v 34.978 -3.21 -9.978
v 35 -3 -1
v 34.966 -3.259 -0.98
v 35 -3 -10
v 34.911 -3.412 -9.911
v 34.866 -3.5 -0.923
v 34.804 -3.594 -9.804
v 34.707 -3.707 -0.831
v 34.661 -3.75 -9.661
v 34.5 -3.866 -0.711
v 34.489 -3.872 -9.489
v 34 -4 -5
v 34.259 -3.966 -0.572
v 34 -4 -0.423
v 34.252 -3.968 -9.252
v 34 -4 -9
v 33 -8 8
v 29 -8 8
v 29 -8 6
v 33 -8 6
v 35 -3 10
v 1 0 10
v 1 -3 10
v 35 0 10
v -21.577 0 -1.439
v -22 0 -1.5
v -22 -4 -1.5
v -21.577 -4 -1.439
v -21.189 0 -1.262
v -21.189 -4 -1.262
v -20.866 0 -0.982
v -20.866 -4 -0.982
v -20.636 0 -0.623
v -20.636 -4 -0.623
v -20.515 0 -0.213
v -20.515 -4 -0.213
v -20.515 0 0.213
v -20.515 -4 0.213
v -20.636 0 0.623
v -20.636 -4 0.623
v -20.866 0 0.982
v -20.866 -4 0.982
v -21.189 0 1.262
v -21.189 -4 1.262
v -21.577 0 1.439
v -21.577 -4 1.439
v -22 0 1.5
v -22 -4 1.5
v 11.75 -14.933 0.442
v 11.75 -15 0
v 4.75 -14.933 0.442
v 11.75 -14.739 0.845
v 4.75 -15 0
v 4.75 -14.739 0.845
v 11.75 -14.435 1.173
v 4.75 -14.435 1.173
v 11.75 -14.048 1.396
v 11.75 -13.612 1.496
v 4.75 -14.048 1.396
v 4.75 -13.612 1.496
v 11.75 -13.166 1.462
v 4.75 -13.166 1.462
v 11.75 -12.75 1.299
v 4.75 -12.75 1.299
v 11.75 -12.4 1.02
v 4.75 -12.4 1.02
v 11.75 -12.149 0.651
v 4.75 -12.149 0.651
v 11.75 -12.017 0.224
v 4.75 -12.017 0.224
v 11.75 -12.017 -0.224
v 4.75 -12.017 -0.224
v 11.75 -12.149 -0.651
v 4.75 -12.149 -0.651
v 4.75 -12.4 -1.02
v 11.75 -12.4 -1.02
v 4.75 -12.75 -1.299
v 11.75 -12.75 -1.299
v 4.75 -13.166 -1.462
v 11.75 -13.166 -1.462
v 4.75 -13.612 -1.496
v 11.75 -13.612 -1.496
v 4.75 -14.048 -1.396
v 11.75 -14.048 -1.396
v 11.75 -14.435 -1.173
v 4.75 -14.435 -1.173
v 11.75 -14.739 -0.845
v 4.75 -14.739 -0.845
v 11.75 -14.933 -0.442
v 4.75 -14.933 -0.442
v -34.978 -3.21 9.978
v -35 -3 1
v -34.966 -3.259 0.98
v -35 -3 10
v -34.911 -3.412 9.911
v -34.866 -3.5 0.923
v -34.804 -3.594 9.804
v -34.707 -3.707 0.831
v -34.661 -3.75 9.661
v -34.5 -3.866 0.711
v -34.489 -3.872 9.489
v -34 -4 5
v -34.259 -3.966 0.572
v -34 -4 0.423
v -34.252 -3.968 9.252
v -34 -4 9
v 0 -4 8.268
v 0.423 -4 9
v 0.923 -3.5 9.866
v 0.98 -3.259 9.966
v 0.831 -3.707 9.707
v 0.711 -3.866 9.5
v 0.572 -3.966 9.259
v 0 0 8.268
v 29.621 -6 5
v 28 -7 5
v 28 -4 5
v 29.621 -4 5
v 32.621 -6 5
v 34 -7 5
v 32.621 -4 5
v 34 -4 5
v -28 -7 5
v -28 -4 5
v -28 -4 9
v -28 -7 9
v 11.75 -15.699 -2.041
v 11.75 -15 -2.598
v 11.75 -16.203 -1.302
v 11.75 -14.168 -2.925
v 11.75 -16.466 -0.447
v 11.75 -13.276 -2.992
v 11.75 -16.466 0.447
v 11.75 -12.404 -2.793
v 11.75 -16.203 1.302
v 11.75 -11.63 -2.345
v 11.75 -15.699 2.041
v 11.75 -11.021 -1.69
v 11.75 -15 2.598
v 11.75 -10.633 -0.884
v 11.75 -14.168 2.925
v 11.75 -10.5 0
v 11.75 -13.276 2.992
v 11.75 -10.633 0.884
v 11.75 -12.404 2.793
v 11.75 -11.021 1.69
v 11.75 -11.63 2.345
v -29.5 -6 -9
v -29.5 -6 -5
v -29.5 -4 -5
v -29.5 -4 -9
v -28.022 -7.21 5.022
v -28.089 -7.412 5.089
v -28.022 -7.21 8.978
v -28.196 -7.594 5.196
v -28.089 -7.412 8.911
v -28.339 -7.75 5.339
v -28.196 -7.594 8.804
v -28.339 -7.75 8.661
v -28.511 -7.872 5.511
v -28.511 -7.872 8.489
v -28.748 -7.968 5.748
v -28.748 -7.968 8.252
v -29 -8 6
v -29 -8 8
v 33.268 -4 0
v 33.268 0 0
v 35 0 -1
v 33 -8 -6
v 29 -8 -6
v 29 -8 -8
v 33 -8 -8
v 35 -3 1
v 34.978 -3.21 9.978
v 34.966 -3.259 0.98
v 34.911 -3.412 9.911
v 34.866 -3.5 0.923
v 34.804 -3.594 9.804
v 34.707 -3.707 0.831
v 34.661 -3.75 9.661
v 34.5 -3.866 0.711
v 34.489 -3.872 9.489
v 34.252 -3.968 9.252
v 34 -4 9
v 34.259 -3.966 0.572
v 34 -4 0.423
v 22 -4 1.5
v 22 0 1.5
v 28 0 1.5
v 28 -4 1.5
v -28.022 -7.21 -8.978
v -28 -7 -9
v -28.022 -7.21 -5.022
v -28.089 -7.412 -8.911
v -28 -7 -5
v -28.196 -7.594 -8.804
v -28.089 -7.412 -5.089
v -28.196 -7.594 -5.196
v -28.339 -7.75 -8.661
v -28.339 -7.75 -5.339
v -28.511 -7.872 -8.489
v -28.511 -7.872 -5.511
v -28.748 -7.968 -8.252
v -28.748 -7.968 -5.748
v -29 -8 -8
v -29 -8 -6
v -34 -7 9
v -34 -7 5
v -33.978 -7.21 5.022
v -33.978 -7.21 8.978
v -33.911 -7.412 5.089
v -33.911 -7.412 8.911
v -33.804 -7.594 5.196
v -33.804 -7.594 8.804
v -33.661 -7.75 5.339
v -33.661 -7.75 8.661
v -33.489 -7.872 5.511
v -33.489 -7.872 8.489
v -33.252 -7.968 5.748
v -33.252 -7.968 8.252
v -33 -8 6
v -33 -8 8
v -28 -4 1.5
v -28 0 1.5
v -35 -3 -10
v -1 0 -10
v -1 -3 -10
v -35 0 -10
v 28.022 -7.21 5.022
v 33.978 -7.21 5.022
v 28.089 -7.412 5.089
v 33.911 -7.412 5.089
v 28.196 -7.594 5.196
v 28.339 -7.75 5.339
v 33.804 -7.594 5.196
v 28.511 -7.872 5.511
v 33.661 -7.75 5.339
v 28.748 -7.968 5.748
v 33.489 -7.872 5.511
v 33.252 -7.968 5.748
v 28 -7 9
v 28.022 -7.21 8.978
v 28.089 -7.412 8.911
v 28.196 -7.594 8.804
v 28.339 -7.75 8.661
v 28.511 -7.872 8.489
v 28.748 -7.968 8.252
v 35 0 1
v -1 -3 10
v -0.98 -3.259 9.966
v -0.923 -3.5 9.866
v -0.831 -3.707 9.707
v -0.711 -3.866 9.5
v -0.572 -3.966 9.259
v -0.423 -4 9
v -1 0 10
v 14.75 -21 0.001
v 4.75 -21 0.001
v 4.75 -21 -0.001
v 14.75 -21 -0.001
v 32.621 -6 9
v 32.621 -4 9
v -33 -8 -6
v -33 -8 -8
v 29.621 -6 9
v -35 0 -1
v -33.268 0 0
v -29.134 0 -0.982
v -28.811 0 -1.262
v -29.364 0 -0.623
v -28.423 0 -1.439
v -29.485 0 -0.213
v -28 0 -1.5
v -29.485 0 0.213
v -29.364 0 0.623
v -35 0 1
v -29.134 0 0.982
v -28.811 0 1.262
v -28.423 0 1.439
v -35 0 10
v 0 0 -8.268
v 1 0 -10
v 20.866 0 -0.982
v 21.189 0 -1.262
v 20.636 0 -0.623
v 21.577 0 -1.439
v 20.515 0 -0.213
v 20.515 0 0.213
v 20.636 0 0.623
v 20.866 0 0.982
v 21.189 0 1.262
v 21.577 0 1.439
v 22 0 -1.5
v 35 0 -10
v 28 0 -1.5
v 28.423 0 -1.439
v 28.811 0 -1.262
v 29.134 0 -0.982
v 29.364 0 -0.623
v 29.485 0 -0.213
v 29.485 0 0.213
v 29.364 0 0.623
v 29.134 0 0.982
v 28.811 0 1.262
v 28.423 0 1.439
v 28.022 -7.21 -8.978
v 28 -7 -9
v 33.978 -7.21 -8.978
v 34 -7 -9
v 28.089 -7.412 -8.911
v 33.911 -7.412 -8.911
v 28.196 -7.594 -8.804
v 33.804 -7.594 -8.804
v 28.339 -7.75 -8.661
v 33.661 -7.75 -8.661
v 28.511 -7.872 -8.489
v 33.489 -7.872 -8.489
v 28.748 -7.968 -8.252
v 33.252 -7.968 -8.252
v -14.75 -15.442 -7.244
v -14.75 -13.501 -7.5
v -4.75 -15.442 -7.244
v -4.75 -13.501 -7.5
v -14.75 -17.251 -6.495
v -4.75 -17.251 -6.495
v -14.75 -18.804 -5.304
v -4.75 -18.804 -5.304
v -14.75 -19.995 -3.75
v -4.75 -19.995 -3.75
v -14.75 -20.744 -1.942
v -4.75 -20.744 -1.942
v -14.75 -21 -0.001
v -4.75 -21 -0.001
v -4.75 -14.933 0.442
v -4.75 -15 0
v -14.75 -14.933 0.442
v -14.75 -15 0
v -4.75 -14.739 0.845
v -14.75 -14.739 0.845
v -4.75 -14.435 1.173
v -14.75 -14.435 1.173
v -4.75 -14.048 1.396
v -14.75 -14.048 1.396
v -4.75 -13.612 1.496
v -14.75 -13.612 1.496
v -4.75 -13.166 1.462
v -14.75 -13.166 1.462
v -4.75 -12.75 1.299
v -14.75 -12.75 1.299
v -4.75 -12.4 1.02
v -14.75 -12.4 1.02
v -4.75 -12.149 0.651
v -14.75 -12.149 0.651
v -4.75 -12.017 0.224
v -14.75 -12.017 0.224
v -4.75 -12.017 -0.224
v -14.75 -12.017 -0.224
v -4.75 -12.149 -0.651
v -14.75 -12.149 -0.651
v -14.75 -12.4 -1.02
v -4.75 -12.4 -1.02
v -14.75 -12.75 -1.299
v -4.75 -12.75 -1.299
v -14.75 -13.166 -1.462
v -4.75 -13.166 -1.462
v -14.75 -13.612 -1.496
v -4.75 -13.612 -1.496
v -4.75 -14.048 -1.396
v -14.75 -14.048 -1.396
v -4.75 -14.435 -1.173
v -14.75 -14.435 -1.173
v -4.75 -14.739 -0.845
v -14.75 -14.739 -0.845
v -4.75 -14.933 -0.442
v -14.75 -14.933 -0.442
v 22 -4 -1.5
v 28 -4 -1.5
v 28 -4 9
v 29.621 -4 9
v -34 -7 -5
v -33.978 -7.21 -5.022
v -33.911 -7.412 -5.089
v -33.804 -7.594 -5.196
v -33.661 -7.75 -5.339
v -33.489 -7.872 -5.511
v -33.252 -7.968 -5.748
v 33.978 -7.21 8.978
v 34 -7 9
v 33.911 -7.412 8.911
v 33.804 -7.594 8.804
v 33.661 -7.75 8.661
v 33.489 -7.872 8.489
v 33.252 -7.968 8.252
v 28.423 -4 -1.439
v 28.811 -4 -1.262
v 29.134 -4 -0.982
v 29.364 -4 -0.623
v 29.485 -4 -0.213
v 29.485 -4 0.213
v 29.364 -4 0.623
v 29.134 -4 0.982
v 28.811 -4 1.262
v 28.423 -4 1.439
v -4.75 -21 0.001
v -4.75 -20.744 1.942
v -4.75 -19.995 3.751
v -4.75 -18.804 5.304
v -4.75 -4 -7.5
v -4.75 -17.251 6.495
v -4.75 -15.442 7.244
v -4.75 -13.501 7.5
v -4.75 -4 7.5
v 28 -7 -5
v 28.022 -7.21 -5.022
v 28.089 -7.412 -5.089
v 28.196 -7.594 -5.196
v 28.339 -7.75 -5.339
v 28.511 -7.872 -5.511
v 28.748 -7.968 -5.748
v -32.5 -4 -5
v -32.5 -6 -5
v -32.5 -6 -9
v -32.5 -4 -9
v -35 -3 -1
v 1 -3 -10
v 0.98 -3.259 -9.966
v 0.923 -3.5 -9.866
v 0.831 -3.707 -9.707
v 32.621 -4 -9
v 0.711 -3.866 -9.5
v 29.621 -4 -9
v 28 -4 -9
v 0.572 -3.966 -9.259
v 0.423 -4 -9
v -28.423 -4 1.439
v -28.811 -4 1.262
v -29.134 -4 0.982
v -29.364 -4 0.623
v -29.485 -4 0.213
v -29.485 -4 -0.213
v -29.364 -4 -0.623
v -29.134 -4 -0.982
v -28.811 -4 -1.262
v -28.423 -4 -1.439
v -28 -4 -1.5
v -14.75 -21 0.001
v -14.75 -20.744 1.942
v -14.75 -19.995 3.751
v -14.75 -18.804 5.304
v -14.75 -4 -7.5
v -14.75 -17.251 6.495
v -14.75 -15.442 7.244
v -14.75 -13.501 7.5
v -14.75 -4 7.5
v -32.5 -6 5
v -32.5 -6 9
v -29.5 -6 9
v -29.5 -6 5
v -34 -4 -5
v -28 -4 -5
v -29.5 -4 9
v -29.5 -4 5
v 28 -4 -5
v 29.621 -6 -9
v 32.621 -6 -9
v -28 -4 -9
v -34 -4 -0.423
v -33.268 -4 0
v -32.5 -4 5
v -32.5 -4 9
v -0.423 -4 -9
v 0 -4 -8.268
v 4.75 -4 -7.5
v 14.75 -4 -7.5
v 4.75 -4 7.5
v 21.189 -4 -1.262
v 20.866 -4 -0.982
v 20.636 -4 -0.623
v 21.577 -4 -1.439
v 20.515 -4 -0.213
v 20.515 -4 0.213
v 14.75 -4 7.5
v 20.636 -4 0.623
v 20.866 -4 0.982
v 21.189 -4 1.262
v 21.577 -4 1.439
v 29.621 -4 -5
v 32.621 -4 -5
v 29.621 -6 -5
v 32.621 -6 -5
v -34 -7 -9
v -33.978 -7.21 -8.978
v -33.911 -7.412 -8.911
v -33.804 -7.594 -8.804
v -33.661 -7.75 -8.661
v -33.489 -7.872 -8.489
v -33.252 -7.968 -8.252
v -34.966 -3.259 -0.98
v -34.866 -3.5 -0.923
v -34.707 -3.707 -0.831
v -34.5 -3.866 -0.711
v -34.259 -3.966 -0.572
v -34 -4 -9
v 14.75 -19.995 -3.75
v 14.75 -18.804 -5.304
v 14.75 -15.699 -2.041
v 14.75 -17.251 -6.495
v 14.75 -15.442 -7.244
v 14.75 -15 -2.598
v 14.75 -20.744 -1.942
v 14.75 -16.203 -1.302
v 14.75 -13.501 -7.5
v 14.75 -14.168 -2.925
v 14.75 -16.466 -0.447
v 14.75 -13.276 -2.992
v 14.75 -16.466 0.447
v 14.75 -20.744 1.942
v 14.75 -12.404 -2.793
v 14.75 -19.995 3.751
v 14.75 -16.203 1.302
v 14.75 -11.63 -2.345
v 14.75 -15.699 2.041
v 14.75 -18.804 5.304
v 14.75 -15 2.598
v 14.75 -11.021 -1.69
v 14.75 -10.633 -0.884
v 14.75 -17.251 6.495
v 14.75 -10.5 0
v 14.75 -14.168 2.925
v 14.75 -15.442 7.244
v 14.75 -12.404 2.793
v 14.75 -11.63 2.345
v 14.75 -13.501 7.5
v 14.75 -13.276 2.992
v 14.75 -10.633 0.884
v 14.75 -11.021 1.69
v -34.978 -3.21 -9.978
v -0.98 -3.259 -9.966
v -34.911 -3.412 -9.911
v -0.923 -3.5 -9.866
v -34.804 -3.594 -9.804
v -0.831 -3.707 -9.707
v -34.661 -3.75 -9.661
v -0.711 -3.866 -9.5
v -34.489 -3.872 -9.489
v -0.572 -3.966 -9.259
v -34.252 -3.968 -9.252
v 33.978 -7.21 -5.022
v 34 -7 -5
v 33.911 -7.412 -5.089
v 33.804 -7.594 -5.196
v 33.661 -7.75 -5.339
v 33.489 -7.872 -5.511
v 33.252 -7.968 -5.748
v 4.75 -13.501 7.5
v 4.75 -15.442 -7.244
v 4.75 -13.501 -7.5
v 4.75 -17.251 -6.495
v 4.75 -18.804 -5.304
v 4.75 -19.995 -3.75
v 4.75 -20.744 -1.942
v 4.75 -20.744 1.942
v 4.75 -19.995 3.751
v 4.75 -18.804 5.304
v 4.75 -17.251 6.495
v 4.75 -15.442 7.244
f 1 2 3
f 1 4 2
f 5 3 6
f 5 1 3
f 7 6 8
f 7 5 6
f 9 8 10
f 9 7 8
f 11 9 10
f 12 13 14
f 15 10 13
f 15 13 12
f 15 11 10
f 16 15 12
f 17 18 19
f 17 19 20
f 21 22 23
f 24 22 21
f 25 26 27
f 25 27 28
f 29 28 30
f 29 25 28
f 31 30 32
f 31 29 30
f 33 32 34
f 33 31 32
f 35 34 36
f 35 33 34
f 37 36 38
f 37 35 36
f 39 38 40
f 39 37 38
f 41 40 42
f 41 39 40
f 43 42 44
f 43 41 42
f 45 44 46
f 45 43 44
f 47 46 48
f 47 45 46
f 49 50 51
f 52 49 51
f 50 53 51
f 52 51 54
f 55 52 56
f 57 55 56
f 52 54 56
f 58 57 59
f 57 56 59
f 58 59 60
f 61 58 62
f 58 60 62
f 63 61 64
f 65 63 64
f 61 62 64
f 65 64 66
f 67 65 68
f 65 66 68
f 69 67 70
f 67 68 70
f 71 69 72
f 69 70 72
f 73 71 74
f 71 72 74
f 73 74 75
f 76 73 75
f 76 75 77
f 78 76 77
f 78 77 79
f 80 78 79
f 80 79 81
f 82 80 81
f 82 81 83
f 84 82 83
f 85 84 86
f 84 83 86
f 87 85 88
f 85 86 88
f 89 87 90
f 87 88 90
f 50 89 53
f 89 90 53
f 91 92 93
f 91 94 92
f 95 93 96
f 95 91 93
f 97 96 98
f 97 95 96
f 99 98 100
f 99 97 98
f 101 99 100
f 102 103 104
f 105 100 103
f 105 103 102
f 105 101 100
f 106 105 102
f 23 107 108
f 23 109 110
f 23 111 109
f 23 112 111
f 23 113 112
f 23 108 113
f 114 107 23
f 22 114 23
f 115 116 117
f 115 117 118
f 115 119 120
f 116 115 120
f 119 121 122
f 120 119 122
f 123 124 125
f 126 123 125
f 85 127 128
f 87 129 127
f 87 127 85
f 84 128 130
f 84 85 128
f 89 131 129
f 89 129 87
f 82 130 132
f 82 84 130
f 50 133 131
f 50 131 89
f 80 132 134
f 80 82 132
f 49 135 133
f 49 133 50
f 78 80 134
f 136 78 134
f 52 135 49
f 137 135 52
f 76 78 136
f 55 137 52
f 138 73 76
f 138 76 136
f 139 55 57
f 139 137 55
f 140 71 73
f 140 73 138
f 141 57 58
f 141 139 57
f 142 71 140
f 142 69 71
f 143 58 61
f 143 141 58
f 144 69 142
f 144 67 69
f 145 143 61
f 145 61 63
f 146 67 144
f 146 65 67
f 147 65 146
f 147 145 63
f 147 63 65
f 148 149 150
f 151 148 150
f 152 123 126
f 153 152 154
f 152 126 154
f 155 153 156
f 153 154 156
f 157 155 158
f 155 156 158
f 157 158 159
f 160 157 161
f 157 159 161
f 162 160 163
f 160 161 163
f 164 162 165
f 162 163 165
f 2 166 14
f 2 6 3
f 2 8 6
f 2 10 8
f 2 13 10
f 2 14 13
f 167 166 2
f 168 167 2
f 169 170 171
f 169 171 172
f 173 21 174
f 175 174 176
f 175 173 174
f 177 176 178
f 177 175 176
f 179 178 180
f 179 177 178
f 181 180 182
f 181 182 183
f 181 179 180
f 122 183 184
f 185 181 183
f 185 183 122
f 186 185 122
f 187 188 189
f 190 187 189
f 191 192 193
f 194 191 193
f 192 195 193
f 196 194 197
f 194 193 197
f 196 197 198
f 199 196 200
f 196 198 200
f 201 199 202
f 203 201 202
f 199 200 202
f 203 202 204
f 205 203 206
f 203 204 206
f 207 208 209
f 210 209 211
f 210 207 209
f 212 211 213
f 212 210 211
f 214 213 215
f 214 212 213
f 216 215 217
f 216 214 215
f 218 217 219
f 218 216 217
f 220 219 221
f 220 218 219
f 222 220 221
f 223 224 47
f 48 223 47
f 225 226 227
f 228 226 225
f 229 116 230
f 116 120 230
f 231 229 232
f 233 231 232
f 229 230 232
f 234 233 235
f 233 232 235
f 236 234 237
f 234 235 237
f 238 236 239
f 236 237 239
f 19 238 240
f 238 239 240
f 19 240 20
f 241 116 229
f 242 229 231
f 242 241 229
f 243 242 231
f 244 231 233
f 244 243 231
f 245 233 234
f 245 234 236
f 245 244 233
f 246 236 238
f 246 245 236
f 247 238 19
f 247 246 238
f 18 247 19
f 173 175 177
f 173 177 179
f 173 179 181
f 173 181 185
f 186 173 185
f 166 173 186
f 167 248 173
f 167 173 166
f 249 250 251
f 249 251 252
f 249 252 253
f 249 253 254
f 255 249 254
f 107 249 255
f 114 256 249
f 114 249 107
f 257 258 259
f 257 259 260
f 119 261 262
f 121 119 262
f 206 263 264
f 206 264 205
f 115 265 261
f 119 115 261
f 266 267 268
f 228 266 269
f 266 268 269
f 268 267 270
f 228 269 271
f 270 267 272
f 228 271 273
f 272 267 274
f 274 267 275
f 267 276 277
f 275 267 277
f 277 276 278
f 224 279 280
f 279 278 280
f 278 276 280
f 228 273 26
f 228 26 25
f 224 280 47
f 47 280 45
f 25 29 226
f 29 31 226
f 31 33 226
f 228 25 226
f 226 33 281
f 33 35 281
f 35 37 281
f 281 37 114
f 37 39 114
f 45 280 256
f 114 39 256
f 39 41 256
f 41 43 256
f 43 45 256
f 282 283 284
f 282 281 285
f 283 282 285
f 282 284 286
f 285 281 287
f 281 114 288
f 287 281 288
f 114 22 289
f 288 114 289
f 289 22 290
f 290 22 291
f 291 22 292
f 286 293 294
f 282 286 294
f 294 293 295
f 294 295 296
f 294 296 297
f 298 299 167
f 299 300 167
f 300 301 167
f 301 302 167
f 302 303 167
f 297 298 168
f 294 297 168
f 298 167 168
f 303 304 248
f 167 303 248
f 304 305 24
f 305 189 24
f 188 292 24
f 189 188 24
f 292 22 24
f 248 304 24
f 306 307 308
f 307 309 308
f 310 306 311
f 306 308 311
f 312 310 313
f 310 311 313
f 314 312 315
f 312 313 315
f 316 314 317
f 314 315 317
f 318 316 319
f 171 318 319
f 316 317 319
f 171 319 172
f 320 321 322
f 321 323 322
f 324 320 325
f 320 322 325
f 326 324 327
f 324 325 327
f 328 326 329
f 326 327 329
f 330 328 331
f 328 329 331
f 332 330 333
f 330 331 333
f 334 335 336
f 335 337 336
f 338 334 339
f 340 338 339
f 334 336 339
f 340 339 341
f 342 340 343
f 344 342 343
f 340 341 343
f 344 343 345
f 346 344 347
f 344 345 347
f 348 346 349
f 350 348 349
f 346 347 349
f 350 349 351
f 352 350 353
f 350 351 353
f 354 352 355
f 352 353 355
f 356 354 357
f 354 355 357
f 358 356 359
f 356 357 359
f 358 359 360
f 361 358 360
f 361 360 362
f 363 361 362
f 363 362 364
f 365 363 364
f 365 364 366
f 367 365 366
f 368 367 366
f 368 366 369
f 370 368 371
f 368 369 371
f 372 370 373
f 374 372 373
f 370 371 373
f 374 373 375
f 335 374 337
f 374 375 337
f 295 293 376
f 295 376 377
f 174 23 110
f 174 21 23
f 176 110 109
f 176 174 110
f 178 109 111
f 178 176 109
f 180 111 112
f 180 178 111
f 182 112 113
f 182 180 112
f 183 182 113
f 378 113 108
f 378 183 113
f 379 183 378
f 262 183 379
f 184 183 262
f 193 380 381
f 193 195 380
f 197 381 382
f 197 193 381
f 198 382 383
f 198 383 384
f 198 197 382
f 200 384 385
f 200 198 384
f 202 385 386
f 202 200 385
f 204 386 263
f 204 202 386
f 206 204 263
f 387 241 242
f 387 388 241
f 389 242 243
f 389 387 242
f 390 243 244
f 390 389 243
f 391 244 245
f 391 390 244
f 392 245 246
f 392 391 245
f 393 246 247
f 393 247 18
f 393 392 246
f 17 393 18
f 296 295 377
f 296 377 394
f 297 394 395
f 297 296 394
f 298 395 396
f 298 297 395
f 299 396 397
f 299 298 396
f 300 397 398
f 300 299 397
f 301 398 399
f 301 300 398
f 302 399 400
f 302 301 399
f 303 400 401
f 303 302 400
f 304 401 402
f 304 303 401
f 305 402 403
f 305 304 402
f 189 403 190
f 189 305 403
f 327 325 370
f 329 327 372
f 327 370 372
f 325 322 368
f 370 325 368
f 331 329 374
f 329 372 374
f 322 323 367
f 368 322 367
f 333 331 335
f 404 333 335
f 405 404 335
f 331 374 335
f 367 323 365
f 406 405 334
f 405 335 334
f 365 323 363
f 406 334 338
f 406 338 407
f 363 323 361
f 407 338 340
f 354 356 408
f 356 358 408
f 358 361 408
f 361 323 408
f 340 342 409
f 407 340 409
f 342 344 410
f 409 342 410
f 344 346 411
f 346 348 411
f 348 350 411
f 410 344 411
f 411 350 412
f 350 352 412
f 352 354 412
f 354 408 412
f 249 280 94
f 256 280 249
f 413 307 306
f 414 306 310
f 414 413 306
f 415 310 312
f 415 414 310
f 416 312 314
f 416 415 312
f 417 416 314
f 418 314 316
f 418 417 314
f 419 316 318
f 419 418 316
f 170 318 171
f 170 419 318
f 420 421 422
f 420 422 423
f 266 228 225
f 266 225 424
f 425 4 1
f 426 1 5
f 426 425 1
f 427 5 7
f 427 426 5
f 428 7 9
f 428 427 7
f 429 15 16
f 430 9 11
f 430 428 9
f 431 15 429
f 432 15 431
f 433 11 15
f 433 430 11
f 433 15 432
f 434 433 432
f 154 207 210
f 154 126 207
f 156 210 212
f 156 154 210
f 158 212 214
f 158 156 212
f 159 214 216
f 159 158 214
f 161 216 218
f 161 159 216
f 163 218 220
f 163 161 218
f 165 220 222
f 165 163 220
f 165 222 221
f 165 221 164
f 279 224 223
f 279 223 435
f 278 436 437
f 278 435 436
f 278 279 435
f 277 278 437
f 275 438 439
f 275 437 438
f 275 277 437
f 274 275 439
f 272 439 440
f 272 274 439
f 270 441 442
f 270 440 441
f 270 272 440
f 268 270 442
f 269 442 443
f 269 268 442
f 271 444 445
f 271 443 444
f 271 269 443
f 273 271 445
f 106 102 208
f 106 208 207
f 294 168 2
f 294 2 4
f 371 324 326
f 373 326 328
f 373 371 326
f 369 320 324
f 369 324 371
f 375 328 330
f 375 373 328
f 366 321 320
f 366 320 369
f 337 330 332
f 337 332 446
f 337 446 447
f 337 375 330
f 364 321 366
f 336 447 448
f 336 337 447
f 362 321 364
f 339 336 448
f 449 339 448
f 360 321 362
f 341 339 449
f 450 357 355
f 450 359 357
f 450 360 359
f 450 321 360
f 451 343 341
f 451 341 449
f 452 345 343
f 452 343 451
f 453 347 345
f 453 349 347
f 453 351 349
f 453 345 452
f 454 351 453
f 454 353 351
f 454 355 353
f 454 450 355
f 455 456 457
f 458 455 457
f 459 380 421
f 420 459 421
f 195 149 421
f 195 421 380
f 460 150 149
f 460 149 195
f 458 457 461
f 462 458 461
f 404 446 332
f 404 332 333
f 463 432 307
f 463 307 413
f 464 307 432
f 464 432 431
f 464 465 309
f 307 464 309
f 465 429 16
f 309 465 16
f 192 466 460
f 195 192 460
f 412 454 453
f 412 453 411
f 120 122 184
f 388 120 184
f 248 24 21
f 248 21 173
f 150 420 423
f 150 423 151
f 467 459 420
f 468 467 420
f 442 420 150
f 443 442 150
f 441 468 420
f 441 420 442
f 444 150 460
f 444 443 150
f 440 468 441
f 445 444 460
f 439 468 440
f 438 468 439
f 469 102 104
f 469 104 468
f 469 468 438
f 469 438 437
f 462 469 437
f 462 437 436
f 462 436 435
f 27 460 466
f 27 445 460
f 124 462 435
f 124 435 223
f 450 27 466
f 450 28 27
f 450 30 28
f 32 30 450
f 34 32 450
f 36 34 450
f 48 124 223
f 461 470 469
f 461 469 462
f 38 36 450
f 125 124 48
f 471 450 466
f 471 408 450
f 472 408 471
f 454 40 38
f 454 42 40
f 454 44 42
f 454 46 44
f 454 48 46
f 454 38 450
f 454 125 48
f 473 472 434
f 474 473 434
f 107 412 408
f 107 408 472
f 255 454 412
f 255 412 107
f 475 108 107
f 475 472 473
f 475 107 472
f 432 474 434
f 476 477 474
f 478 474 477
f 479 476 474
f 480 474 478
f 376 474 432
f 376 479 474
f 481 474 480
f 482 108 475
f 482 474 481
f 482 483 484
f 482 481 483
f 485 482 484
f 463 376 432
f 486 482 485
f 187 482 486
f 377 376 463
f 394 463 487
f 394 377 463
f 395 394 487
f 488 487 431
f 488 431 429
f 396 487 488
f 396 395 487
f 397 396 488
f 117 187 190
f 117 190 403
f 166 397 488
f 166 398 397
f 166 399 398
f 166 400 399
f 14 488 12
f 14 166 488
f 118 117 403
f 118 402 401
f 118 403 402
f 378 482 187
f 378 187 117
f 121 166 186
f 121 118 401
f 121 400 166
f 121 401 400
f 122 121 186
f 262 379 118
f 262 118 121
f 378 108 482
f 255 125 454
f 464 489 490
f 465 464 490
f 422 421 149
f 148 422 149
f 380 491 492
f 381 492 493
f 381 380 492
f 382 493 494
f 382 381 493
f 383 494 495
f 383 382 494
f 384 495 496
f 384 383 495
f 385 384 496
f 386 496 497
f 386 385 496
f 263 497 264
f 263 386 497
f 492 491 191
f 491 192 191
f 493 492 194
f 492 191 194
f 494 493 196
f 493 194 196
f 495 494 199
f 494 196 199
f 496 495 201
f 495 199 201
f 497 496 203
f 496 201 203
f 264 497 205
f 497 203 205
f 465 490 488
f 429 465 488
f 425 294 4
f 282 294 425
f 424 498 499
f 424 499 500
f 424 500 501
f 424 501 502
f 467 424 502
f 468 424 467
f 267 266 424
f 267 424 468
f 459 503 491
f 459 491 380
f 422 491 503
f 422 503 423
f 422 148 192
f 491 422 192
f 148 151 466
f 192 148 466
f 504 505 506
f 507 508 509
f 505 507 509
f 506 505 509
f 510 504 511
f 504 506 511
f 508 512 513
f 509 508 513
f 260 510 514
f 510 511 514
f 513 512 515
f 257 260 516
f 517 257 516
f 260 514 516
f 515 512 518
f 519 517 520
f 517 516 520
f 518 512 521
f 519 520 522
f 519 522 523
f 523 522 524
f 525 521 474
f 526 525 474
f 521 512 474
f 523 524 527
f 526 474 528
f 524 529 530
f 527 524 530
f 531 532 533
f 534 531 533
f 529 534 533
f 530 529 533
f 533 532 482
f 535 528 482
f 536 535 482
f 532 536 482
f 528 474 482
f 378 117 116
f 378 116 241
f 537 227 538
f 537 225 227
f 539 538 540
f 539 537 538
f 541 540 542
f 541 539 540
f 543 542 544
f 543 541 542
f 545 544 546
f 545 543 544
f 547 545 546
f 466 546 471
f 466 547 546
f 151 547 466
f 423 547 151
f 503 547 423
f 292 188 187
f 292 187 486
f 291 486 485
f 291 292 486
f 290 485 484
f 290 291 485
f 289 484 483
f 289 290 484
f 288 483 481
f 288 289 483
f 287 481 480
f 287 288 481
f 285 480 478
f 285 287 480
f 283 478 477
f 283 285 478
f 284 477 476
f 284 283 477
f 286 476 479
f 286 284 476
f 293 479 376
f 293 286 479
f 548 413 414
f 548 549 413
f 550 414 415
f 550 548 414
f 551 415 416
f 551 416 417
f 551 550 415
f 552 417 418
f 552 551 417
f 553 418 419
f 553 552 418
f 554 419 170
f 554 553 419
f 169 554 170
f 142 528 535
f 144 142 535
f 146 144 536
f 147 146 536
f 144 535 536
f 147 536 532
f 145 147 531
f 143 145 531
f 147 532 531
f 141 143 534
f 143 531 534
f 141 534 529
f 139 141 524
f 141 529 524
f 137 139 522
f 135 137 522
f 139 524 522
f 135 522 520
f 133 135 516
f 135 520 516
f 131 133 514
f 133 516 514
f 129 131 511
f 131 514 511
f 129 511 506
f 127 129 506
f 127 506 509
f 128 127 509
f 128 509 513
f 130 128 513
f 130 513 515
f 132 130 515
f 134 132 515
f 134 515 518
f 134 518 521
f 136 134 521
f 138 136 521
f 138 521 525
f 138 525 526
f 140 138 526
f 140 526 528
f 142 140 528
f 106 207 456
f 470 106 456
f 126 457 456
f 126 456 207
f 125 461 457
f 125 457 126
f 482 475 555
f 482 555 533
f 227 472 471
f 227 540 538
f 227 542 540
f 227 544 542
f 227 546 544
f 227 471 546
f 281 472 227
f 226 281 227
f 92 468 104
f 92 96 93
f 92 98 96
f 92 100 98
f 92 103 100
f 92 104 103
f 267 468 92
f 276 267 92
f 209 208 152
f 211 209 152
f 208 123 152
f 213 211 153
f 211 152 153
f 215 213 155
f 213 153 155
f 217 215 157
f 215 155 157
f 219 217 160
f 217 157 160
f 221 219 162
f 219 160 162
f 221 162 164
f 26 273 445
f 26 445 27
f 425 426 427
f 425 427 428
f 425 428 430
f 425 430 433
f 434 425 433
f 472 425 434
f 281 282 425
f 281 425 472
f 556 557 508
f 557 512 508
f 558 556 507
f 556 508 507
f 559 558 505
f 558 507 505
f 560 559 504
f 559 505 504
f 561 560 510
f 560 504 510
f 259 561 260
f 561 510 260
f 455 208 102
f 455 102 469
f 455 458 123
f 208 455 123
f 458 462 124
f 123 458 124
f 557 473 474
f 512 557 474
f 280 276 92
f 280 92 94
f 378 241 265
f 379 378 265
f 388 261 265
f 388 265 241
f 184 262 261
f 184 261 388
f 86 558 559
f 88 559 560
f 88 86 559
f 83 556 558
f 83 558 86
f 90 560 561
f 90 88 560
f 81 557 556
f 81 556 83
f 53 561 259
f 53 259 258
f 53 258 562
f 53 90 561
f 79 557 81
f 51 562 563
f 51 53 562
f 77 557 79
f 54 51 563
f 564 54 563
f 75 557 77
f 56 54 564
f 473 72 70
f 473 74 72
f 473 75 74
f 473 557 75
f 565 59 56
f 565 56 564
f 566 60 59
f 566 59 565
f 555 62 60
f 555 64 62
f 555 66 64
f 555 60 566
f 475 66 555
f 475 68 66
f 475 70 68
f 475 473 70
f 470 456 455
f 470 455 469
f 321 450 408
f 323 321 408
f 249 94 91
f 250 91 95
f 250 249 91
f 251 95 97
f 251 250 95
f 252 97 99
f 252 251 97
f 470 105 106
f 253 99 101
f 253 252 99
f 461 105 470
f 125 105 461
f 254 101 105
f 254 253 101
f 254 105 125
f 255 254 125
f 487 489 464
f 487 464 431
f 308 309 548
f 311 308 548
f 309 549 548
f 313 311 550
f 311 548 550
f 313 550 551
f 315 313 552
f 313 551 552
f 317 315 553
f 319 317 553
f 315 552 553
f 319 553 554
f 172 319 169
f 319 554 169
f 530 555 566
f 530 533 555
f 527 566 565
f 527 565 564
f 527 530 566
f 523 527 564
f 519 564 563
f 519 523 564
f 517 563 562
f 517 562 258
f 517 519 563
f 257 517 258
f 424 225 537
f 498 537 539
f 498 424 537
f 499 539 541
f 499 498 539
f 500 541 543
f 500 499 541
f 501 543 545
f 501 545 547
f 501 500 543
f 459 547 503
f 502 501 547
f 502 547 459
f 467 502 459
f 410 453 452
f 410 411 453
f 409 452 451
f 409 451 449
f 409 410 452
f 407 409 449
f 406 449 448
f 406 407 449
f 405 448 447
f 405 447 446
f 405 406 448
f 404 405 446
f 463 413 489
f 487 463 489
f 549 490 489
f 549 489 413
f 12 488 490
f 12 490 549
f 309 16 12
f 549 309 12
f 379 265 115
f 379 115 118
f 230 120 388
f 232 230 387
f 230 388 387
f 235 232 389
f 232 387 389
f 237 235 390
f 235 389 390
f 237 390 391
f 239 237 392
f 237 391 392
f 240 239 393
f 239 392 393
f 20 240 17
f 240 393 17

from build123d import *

# Parameters (mm, degrees)
SKETCH001_W         = 10
SKETCH001_H         = 15
PAD001_DEPTH        = 21
FILLET001_R         = 7.499
SKETCH005_W         = 10
SKETCH005_H         = 15
PAD002_DEPTH        = 21
FILLET002_R         = 7.499
PAD_DEPTH           = 4
FILLET_R            = 1
SKETCH008_W         = 6
SKETCH008_H         = 4
PAD003_DEPTH        = 8
SKETCH009_W         = 6
SKETCH009_H         = 4
PAD004_DEPTH        = 8
SKETCH010_W         = 6
SKETCH010_H         = 4
PAD005_DEPTH        = 8
SKETCH011_W         = 6
SKETCH011_H         = 4
PAD006_DEPTH        = 8
FILLET003_R         = 1
HOLE001_D           = 3
HOLE001_DEPTH       = 100
HOLE001_CBORE_D     = 6
HOLE001_CBORE_DEPTH = 3
SKETCH013_W         = 3
SKETCH013_H         = 2
POCKET_DEPTH        = 15
SKETCH014_W         = 3
SKETCH014_H         = 2
POCKET001_DEPTH     = 15


with BuildPart() as left_hinge:
    # Sketch001 → Pad001 (new body)
    with BuildSketch(Plane.XZ):
        with Locations((-9.75, 0)):
            Rectangle(SKETCH001_W, SKETCH001_H)
    extrude(amount=PAD001_DEPTH)

    # Fillet001
    fillet001_edges = [left_hinge.edges().sort_by_distance(p)[0] for p in [
        (-9.75, -21, -7.5),
        (-9.75, -21, 7.5),
    ]]
    fillet(fillet001_edges, radius=FILLET001_R)


with BuildPart() as body002:
    # Sketch005 → Pad002 (new body)
    with BuildSketch(Plane.XZ):
        with Locations((9.75, 0)):
            Rectangle(SKETCH005_W, SKETCH005_H)
    extrude(amount=PAD002_DEPTH)

    # Fillet002
    fillet002_edges = [body002.edges().sort_by_distance(p)[0] for p in [
        (9.75, -21, -7.5),
        (9.75, -21, 7.5),
    ]]
    fillet(fillet002_edges, radius=FILLET002_R)


with BuildPart() as base:
    # Sketch → Pad (new body)
    with BuildSketch(Plane.XZ):
        Polygon((-35, 10), (-1, 10), (0, 8.267949), (1, 10), (35, 10), (35, 1), (33.267949, 0), (35, -1), (35, -10), (1, -10), (0, -8.267949), (-1, -10), (-35, -10), (-35, -1), (-33.267949, 0), (-35, 1), align=None)
        with BuildLine():
            ThreePointArc((-28, 1.5), (-29.5, 0), (-28, -1.5))
            Line((-28, -1.5), (-22, -1.5))
            ThreePointArc((-22, -1.5), (-20.5, 0), (-22, 1.5))
            Line((-28, 1.5), (-22, 1.5))
        make_face(mode=Mode.SUBTRACT)
        with BuildLine():
            ThreePointArc((22, 1.5), (20.5, 0), (22, -1.5))
            Line((22, -1.5), (28, -1.5))
            ThreePointArc((28, -1.5), (29.5, 0), (28, 1.5))
            Line((22, 1.5), (28, 1.5))
        make_face(mode=Mode.SUBTRACT)
    extrude(amount=PAD_DEPTH)

    # Fillet
    fillet_edges = [base.edges().sort_by_distance(p)[0] for p in [
        (-18, -4, -10),
        (18, -4, -10),
        (35, -4, -5.5),
        (35, -4, 5.5),
        (18, -4, 10),
        (-18, -4, 10),
        (-35, -4, 5.5),
        (-35, -4, -5.5),
    ]]
    fillet(fillet_edges, radius=FILLET_R)

    # Boolean: union Left hinge
    add(left_hinge.part)

    # Boolean001: union Body002
    add(body002.part)

    # Sketch008 → Pad003 (join)
    with BuildSketch(Plane.XZ):
        with Locations((-31, 7)):
            Rectangle(SKETCH008_W, SKETCH008_H)
    extrude(amount=PAD003_DEPTH)

    # Sketch009 → Pad004 (join)
    with BuildSketch(Plane.XZ):
        with Locations((31, 7)):
            Rectangle(SKETCH009_W, SKETCH009_H)
    extrude(amount=PAD004_DEPTH)

    # Sketch010 → Pad005 (join)
    with BuildSketch(Plane.XZ):
        with Locations((-31, -7)):
            Rectangle(SKETCH010_W, SKETCH010_H)
    extrude(amount=PAD005_DEPTH)

    # Sketch011 → Pad006 (join)
    with BuildSketch(Plane.XZ):
        with Locations((31, -7)):
            Rectangle(SKETCH011_W, SKETCH011_H)
    extrude(amount=PAD006_DEPTH)

    # Fillet003
    fillet003_edges = [base.edges().sort_by_distance(p)[0] for p in [
        (-34, -8, 7),
        (-31, -8, 5),
        (-28, -8, 7),
        (-31, -8, 9),
        (-34, -8, -7),
        (-31, -8, -9),
        (-28, -8, -7),
        (-31, -8, -5),
        (28, -8, -7),
        (31, -8, -9),
        (34, -8, -7),
        (31, -8, -5),
        (28, -8, 7),
        (31, -8, 5),
        (34, -8, 7),
        (31, -8, 9),
    ]]
    fillet(fillet003_edges, radius=FILLET003_R)

    # Hole001
    with Locations(Plane.YZ.offset(14.75)):
        with Locations((-13.5, 0)):
            CounterBoreHole(HOLE001_D / 2, HOLE001_CBORE_D / 2, HOLE001_CBORE_DEPTH, depth=HOLE001_DEPTH)

    # Sketch013 → Pocket (cut, symmetric)
    with BuildSketch(Plane.XY):
        with Locations((-31, -5)):
            Rectangle(SKETCH013_W, SKETCH013_H)
    extrude(amount=POCKET_DEPTH, both=True, mode=Mode.SUBTRACT)

    # Sketch014 → Pocket001 (cut, symmetric)
    with BuildSketch(Plane.XY):
        with Locations((31.120665, -5)):
            Rectangle(SKETCH014_W, SKETCH014_H)
    extrude(amount=POCKET001_DEPTH, both=True, mode=Mode.SUBTRACT)


solid = base.part
